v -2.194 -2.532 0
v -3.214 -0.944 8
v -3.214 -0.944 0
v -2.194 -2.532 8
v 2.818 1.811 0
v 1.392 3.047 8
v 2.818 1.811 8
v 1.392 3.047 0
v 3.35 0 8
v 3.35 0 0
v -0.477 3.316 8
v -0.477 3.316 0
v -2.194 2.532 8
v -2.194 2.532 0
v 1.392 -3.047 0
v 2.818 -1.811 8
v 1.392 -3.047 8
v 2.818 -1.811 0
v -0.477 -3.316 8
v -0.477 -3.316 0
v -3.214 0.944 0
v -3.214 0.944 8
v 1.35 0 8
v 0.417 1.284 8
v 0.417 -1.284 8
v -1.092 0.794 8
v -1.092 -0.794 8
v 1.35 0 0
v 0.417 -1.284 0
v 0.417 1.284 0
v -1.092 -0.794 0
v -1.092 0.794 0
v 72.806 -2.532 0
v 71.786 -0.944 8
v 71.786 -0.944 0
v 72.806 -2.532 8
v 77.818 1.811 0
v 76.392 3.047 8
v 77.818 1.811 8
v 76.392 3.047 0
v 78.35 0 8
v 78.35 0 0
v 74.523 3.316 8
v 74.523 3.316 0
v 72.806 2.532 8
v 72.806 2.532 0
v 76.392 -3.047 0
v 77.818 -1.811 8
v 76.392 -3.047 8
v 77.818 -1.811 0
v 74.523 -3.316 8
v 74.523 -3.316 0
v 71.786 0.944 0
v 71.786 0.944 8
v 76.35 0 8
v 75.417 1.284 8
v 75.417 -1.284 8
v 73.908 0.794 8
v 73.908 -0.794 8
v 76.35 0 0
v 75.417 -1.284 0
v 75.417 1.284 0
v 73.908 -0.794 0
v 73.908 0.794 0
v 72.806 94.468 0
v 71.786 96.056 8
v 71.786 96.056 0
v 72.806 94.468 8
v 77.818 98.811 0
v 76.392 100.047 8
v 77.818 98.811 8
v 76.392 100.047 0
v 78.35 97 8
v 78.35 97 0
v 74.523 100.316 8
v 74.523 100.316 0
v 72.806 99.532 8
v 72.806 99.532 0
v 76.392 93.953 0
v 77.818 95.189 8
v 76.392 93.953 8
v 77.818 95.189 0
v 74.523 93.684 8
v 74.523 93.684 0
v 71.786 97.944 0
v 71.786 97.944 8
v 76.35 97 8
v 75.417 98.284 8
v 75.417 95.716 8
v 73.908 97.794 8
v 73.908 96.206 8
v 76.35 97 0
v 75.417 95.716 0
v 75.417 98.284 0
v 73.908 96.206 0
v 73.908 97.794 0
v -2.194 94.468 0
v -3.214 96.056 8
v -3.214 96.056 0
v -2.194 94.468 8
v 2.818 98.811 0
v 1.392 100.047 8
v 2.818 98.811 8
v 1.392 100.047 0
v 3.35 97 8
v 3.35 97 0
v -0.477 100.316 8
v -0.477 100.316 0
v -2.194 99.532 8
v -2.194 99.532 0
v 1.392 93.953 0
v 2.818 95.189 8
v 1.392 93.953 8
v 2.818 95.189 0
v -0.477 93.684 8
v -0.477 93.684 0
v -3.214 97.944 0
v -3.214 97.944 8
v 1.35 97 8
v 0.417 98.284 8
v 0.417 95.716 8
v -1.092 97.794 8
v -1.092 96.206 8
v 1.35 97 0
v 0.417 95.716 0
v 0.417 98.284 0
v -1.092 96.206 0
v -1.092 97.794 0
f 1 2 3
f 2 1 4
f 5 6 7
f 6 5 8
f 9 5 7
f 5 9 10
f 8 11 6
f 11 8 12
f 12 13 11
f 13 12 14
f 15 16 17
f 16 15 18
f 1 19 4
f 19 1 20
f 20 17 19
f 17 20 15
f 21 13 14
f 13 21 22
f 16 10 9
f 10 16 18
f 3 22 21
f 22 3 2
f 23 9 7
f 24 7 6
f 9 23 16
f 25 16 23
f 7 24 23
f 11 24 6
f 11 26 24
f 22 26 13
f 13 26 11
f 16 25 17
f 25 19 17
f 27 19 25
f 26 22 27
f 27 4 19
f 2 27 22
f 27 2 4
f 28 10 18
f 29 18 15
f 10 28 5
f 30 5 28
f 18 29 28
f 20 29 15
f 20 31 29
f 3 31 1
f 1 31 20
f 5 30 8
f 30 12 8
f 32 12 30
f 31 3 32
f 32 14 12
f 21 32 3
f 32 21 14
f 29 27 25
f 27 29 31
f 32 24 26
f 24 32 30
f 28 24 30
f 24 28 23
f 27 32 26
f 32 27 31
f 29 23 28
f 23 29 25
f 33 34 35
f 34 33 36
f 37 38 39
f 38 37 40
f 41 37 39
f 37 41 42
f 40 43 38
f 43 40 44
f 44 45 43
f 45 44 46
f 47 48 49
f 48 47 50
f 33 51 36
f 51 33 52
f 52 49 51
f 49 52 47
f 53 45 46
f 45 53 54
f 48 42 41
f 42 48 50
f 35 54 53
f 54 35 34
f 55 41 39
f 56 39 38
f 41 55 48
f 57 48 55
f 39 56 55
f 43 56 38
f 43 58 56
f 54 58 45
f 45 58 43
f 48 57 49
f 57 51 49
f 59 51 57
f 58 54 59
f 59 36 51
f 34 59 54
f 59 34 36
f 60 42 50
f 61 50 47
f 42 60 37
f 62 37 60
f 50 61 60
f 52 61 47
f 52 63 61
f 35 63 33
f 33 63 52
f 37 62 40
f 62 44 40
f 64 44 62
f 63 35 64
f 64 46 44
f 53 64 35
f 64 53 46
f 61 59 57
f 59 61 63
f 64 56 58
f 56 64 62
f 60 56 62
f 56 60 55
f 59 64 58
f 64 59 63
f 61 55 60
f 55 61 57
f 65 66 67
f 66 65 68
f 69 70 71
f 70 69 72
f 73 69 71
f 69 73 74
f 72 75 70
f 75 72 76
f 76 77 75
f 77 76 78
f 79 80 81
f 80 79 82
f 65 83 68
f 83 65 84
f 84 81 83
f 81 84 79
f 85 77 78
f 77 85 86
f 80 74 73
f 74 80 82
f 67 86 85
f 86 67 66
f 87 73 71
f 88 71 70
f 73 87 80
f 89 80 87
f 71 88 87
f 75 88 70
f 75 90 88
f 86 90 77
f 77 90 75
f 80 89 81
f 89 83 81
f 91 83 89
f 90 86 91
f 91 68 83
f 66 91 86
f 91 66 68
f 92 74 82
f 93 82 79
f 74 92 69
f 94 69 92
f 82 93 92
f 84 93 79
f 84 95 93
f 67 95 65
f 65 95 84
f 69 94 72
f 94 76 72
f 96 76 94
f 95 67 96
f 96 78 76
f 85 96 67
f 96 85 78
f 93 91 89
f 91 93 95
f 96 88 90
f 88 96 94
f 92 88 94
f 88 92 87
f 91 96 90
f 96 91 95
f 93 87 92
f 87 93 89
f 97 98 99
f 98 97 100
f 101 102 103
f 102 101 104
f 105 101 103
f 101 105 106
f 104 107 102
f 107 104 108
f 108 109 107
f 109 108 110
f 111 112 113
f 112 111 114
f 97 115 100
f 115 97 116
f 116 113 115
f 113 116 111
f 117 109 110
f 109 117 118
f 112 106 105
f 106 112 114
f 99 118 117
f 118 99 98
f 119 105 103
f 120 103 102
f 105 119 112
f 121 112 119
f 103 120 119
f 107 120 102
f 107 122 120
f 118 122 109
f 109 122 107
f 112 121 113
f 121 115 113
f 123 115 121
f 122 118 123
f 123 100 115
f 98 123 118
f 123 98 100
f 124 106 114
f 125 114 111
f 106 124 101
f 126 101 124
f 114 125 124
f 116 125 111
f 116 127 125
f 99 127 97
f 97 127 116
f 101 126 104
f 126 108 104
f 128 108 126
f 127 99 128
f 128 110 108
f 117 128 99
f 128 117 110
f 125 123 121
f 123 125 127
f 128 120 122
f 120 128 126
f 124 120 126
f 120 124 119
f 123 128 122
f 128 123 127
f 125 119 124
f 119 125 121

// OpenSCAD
// holes are 75 x 97 mm offset
// M3 holes so 2.7mm for 

module hole() {
    m3_tap_diameter = 2.7;
    m3_tap_length = 8;
    wall_thickness=2;
    difference() {
        cylinder(r=m3_tap_diameter/2+wall_thickness,h=m3_tap_length);
        cylinder(r=m3_tap_diameter/2,h=m3_tap_length);
    }
}
hole();
translate([75,0,0]) hole();
translate([75,97,0]) hole();
translate([0,97,0]) hole();
